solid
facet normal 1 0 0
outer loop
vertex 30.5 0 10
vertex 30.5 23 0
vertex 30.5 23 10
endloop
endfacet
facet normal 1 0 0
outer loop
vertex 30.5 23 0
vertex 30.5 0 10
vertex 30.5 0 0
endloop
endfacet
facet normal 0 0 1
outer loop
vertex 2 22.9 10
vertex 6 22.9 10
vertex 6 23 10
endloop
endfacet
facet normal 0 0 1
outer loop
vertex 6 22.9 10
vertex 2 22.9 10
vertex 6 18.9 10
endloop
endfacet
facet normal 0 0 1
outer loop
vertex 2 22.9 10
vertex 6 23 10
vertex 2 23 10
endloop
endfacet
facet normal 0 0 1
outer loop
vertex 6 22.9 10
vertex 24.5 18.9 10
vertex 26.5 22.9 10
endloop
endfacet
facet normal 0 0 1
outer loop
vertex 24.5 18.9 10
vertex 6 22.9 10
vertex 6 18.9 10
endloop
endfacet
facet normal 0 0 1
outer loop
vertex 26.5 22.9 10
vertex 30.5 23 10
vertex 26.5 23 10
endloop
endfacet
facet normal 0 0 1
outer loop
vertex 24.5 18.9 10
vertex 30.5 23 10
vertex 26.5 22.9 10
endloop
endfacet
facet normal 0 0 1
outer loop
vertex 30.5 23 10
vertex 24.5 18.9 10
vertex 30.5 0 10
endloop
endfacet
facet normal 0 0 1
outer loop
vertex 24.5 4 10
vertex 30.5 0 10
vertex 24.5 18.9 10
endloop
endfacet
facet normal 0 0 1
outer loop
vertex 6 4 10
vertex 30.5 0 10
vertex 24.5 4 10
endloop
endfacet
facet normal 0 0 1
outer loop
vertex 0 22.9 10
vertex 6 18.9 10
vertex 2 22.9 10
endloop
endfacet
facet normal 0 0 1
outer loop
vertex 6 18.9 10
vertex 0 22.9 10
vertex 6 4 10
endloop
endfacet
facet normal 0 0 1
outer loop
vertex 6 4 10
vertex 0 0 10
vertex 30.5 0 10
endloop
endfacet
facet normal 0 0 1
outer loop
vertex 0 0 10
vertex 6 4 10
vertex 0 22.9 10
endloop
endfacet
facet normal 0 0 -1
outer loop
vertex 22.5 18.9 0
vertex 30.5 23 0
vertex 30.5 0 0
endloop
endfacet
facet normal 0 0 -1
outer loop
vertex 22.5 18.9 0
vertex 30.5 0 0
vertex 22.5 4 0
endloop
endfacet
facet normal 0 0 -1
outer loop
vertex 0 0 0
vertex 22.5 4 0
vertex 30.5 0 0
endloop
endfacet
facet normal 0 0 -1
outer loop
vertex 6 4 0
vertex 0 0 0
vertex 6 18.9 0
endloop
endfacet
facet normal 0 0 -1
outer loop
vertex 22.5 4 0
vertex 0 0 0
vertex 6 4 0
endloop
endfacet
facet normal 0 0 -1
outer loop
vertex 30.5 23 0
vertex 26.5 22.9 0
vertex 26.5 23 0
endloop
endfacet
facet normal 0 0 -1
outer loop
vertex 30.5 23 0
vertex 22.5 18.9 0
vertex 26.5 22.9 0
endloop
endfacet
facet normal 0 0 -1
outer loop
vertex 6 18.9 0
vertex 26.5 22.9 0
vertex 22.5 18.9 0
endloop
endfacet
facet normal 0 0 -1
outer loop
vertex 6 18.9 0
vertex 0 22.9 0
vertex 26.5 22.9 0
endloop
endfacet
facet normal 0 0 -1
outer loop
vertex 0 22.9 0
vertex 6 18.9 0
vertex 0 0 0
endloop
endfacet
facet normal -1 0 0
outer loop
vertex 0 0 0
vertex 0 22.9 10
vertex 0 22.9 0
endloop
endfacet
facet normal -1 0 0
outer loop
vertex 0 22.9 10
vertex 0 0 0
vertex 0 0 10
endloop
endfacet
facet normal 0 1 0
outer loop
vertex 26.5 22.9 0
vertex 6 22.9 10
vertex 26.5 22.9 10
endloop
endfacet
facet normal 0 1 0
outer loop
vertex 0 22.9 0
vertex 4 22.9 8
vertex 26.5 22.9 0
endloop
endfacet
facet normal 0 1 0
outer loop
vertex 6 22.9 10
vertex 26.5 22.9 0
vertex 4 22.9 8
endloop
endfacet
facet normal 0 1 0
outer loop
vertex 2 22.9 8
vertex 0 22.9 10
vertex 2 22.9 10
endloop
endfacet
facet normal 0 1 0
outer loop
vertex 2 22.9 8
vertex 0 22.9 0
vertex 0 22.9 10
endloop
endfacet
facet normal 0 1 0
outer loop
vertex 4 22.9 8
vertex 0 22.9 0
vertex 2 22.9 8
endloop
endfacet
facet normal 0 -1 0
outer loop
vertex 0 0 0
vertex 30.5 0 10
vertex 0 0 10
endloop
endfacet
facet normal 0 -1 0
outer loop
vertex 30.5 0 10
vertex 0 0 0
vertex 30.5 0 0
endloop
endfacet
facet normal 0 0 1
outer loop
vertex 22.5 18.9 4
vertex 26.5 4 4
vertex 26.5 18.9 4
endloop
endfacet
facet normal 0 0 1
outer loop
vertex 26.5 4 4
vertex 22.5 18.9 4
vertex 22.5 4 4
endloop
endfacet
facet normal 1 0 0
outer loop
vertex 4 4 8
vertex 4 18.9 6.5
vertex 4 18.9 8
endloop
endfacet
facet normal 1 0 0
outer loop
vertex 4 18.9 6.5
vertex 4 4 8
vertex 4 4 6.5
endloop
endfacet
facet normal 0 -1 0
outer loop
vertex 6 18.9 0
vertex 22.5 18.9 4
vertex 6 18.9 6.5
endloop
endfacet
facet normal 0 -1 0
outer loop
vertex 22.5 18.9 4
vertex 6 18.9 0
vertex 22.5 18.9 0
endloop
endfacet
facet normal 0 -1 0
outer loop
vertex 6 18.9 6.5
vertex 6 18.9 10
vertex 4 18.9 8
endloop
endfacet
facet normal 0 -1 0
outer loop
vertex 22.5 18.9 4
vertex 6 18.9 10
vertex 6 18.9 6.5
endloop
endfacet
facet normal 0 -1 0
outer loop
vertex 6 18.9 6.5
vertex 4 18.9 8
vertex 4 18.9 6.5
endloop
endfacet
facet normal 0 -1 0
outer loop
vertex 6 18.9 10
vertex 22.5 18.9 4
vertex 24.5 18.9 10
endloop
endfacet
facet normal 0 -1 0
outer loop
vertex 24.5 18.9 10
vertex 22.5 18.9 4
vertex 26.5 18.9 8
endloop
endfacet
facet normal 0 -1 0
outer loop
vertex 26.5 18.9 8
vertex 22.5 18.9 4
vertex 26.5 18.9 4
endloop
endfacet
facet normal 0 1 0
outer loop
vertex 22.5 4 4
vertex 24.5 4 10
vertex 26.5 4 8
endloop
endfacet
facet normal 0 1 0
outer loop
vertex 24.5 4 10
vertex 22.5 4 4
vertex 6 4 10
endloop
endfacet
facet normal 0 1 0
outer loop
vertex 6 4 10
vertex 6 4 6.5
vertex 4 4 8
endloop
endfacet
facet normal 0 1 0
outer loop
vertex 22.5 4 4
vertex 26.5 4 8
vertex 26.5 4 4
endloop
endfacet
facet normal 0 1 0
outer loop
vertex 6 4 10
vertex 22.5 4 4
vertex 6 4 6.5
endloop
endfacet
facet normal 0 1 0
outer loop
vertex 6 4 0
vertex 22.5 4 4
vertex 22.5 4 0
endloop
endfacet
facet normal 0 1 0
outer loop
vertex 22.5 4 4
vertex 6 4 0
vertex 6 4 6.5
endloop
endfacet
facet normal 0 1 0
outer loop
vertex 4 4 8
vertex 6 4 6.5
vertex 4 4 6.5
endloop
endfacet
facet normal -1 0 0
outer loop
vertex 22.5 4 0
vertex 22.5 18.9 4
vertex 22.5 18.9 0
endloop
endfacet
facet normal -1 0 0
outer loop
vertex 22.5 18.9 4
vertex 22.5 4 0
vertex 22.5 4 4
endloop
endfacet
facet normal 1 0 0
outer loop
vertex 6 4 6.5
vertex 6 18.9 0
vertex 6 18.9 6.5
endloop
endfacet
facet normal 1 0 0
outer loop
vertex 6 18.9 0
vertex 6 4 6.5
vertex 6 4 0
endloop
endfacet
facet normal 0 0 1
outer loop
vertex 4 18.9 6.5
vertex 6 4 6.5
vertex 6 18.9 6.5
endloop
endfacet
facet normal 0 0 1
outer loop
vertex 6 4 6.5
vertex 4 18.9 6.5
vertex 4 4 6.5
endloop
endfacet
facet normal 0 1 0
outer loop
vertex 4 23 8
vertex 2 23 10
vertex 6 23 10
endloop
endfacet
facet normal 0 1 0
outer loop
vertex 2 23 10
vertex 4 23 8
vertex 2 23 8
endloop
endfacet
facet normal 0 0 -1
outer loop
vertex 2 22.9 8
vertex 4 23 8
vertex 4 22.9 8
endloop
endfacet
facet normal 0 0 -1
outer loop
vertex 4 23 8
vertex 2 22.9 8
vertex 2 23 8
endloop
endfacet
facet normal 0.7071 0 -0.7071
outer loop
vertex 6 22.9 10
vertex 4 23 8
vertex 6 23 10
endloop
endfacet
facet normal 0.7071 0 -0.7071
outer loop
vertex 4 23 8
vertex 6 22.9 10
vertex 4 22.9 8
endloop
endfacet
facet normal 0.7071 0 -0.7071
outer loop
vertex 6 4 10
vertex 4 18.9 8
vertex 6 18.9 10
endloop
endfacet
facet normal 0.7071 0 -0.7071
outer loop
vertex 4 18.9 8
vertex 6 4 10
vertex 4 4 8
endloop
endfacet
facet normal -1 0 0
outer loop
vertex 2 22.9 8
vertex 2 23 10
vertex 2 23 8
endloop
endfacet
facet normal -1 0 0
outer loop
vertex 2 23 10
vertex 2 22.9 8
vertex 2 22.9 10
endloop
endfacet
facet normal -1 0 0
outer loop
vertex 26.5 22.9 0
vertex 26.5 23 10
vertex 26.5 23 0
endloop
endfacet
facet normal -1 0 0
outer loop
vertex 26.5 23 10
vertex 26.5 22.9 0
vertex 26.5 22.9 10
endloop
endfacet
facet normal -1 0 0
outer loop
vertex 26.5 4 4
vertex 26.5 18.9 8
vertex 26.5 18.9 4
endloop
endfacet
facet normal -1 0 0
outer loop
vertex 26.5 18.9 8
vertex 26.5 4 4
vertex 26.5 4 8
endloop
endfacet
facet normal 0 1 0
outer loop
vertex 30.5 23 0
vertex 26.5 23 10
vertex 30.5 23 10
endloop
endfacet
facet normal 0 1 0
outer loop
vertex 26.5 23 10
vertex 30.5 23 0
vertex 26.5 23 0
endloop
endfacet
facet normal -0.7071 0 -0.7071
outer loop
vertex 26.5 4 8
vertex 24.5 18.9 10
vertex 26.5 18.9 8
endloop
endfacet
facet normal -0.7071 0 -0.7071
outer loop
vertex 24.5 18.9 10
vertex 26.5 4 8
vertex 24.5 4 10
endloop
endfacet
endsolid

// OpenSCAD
jack_length =16.5;
jack_width = 14.9;

wall_height = 10;
wall_thickness = 4;

catch_overhang = 2;

small_clip_depth = catch_overhang;
big_clip_depth = catch_overhang + 2;
big_clip_clearance = 4;
small_clip_clearance = 6.5;

outer_length = jack_length + small_clip_depth + big_clip_depth +
                            (wall_thickness * 2);
outer_width = jack_width + (wall_thickness * 2);
fudge=0.1;

module clip_catch() {
  rotate([90, 0, 0]) {
    linear_extrude(height = outer_width) {
      polygon(points = [[0,0],
                                       [catch_overhang,0],
                                       [wall_thickness,catch_overhang],
                                       [0,catch_overhang]],
                      paths = [[0,1,2,3]]);
    }
  }
}

module keystone() {
union() {

difference() {
  difference() {
    cube([outer_length, outer_width, wall_height]);
   translate([wall_thickness, wall_thickness, big_clip_clearance]) {
      cube([outer_length, jack_width, wall_height]);
    }
  }
  translate([wall_thickness + small_clip_depth, wall_thickness, -fudge/2]){
    cube([jack_length, jack_width, wall_height+fudge]);
  }
}

cube([wall_thickness, outer_width, wall_height]);

cube([wall_thickness + small_clip_depth,
           outer_width, small_clip_clearance]);

translate([2, 23, 8]) {
  clip_catch();
}

translate([26.5,0,0]) {
  cube([4, 23, 10]);
}

translate([28.5, 0, 8]) {
  rotate([0, 0, -180]) {
    clip_catch();
  }
}


}
}

keystone();
